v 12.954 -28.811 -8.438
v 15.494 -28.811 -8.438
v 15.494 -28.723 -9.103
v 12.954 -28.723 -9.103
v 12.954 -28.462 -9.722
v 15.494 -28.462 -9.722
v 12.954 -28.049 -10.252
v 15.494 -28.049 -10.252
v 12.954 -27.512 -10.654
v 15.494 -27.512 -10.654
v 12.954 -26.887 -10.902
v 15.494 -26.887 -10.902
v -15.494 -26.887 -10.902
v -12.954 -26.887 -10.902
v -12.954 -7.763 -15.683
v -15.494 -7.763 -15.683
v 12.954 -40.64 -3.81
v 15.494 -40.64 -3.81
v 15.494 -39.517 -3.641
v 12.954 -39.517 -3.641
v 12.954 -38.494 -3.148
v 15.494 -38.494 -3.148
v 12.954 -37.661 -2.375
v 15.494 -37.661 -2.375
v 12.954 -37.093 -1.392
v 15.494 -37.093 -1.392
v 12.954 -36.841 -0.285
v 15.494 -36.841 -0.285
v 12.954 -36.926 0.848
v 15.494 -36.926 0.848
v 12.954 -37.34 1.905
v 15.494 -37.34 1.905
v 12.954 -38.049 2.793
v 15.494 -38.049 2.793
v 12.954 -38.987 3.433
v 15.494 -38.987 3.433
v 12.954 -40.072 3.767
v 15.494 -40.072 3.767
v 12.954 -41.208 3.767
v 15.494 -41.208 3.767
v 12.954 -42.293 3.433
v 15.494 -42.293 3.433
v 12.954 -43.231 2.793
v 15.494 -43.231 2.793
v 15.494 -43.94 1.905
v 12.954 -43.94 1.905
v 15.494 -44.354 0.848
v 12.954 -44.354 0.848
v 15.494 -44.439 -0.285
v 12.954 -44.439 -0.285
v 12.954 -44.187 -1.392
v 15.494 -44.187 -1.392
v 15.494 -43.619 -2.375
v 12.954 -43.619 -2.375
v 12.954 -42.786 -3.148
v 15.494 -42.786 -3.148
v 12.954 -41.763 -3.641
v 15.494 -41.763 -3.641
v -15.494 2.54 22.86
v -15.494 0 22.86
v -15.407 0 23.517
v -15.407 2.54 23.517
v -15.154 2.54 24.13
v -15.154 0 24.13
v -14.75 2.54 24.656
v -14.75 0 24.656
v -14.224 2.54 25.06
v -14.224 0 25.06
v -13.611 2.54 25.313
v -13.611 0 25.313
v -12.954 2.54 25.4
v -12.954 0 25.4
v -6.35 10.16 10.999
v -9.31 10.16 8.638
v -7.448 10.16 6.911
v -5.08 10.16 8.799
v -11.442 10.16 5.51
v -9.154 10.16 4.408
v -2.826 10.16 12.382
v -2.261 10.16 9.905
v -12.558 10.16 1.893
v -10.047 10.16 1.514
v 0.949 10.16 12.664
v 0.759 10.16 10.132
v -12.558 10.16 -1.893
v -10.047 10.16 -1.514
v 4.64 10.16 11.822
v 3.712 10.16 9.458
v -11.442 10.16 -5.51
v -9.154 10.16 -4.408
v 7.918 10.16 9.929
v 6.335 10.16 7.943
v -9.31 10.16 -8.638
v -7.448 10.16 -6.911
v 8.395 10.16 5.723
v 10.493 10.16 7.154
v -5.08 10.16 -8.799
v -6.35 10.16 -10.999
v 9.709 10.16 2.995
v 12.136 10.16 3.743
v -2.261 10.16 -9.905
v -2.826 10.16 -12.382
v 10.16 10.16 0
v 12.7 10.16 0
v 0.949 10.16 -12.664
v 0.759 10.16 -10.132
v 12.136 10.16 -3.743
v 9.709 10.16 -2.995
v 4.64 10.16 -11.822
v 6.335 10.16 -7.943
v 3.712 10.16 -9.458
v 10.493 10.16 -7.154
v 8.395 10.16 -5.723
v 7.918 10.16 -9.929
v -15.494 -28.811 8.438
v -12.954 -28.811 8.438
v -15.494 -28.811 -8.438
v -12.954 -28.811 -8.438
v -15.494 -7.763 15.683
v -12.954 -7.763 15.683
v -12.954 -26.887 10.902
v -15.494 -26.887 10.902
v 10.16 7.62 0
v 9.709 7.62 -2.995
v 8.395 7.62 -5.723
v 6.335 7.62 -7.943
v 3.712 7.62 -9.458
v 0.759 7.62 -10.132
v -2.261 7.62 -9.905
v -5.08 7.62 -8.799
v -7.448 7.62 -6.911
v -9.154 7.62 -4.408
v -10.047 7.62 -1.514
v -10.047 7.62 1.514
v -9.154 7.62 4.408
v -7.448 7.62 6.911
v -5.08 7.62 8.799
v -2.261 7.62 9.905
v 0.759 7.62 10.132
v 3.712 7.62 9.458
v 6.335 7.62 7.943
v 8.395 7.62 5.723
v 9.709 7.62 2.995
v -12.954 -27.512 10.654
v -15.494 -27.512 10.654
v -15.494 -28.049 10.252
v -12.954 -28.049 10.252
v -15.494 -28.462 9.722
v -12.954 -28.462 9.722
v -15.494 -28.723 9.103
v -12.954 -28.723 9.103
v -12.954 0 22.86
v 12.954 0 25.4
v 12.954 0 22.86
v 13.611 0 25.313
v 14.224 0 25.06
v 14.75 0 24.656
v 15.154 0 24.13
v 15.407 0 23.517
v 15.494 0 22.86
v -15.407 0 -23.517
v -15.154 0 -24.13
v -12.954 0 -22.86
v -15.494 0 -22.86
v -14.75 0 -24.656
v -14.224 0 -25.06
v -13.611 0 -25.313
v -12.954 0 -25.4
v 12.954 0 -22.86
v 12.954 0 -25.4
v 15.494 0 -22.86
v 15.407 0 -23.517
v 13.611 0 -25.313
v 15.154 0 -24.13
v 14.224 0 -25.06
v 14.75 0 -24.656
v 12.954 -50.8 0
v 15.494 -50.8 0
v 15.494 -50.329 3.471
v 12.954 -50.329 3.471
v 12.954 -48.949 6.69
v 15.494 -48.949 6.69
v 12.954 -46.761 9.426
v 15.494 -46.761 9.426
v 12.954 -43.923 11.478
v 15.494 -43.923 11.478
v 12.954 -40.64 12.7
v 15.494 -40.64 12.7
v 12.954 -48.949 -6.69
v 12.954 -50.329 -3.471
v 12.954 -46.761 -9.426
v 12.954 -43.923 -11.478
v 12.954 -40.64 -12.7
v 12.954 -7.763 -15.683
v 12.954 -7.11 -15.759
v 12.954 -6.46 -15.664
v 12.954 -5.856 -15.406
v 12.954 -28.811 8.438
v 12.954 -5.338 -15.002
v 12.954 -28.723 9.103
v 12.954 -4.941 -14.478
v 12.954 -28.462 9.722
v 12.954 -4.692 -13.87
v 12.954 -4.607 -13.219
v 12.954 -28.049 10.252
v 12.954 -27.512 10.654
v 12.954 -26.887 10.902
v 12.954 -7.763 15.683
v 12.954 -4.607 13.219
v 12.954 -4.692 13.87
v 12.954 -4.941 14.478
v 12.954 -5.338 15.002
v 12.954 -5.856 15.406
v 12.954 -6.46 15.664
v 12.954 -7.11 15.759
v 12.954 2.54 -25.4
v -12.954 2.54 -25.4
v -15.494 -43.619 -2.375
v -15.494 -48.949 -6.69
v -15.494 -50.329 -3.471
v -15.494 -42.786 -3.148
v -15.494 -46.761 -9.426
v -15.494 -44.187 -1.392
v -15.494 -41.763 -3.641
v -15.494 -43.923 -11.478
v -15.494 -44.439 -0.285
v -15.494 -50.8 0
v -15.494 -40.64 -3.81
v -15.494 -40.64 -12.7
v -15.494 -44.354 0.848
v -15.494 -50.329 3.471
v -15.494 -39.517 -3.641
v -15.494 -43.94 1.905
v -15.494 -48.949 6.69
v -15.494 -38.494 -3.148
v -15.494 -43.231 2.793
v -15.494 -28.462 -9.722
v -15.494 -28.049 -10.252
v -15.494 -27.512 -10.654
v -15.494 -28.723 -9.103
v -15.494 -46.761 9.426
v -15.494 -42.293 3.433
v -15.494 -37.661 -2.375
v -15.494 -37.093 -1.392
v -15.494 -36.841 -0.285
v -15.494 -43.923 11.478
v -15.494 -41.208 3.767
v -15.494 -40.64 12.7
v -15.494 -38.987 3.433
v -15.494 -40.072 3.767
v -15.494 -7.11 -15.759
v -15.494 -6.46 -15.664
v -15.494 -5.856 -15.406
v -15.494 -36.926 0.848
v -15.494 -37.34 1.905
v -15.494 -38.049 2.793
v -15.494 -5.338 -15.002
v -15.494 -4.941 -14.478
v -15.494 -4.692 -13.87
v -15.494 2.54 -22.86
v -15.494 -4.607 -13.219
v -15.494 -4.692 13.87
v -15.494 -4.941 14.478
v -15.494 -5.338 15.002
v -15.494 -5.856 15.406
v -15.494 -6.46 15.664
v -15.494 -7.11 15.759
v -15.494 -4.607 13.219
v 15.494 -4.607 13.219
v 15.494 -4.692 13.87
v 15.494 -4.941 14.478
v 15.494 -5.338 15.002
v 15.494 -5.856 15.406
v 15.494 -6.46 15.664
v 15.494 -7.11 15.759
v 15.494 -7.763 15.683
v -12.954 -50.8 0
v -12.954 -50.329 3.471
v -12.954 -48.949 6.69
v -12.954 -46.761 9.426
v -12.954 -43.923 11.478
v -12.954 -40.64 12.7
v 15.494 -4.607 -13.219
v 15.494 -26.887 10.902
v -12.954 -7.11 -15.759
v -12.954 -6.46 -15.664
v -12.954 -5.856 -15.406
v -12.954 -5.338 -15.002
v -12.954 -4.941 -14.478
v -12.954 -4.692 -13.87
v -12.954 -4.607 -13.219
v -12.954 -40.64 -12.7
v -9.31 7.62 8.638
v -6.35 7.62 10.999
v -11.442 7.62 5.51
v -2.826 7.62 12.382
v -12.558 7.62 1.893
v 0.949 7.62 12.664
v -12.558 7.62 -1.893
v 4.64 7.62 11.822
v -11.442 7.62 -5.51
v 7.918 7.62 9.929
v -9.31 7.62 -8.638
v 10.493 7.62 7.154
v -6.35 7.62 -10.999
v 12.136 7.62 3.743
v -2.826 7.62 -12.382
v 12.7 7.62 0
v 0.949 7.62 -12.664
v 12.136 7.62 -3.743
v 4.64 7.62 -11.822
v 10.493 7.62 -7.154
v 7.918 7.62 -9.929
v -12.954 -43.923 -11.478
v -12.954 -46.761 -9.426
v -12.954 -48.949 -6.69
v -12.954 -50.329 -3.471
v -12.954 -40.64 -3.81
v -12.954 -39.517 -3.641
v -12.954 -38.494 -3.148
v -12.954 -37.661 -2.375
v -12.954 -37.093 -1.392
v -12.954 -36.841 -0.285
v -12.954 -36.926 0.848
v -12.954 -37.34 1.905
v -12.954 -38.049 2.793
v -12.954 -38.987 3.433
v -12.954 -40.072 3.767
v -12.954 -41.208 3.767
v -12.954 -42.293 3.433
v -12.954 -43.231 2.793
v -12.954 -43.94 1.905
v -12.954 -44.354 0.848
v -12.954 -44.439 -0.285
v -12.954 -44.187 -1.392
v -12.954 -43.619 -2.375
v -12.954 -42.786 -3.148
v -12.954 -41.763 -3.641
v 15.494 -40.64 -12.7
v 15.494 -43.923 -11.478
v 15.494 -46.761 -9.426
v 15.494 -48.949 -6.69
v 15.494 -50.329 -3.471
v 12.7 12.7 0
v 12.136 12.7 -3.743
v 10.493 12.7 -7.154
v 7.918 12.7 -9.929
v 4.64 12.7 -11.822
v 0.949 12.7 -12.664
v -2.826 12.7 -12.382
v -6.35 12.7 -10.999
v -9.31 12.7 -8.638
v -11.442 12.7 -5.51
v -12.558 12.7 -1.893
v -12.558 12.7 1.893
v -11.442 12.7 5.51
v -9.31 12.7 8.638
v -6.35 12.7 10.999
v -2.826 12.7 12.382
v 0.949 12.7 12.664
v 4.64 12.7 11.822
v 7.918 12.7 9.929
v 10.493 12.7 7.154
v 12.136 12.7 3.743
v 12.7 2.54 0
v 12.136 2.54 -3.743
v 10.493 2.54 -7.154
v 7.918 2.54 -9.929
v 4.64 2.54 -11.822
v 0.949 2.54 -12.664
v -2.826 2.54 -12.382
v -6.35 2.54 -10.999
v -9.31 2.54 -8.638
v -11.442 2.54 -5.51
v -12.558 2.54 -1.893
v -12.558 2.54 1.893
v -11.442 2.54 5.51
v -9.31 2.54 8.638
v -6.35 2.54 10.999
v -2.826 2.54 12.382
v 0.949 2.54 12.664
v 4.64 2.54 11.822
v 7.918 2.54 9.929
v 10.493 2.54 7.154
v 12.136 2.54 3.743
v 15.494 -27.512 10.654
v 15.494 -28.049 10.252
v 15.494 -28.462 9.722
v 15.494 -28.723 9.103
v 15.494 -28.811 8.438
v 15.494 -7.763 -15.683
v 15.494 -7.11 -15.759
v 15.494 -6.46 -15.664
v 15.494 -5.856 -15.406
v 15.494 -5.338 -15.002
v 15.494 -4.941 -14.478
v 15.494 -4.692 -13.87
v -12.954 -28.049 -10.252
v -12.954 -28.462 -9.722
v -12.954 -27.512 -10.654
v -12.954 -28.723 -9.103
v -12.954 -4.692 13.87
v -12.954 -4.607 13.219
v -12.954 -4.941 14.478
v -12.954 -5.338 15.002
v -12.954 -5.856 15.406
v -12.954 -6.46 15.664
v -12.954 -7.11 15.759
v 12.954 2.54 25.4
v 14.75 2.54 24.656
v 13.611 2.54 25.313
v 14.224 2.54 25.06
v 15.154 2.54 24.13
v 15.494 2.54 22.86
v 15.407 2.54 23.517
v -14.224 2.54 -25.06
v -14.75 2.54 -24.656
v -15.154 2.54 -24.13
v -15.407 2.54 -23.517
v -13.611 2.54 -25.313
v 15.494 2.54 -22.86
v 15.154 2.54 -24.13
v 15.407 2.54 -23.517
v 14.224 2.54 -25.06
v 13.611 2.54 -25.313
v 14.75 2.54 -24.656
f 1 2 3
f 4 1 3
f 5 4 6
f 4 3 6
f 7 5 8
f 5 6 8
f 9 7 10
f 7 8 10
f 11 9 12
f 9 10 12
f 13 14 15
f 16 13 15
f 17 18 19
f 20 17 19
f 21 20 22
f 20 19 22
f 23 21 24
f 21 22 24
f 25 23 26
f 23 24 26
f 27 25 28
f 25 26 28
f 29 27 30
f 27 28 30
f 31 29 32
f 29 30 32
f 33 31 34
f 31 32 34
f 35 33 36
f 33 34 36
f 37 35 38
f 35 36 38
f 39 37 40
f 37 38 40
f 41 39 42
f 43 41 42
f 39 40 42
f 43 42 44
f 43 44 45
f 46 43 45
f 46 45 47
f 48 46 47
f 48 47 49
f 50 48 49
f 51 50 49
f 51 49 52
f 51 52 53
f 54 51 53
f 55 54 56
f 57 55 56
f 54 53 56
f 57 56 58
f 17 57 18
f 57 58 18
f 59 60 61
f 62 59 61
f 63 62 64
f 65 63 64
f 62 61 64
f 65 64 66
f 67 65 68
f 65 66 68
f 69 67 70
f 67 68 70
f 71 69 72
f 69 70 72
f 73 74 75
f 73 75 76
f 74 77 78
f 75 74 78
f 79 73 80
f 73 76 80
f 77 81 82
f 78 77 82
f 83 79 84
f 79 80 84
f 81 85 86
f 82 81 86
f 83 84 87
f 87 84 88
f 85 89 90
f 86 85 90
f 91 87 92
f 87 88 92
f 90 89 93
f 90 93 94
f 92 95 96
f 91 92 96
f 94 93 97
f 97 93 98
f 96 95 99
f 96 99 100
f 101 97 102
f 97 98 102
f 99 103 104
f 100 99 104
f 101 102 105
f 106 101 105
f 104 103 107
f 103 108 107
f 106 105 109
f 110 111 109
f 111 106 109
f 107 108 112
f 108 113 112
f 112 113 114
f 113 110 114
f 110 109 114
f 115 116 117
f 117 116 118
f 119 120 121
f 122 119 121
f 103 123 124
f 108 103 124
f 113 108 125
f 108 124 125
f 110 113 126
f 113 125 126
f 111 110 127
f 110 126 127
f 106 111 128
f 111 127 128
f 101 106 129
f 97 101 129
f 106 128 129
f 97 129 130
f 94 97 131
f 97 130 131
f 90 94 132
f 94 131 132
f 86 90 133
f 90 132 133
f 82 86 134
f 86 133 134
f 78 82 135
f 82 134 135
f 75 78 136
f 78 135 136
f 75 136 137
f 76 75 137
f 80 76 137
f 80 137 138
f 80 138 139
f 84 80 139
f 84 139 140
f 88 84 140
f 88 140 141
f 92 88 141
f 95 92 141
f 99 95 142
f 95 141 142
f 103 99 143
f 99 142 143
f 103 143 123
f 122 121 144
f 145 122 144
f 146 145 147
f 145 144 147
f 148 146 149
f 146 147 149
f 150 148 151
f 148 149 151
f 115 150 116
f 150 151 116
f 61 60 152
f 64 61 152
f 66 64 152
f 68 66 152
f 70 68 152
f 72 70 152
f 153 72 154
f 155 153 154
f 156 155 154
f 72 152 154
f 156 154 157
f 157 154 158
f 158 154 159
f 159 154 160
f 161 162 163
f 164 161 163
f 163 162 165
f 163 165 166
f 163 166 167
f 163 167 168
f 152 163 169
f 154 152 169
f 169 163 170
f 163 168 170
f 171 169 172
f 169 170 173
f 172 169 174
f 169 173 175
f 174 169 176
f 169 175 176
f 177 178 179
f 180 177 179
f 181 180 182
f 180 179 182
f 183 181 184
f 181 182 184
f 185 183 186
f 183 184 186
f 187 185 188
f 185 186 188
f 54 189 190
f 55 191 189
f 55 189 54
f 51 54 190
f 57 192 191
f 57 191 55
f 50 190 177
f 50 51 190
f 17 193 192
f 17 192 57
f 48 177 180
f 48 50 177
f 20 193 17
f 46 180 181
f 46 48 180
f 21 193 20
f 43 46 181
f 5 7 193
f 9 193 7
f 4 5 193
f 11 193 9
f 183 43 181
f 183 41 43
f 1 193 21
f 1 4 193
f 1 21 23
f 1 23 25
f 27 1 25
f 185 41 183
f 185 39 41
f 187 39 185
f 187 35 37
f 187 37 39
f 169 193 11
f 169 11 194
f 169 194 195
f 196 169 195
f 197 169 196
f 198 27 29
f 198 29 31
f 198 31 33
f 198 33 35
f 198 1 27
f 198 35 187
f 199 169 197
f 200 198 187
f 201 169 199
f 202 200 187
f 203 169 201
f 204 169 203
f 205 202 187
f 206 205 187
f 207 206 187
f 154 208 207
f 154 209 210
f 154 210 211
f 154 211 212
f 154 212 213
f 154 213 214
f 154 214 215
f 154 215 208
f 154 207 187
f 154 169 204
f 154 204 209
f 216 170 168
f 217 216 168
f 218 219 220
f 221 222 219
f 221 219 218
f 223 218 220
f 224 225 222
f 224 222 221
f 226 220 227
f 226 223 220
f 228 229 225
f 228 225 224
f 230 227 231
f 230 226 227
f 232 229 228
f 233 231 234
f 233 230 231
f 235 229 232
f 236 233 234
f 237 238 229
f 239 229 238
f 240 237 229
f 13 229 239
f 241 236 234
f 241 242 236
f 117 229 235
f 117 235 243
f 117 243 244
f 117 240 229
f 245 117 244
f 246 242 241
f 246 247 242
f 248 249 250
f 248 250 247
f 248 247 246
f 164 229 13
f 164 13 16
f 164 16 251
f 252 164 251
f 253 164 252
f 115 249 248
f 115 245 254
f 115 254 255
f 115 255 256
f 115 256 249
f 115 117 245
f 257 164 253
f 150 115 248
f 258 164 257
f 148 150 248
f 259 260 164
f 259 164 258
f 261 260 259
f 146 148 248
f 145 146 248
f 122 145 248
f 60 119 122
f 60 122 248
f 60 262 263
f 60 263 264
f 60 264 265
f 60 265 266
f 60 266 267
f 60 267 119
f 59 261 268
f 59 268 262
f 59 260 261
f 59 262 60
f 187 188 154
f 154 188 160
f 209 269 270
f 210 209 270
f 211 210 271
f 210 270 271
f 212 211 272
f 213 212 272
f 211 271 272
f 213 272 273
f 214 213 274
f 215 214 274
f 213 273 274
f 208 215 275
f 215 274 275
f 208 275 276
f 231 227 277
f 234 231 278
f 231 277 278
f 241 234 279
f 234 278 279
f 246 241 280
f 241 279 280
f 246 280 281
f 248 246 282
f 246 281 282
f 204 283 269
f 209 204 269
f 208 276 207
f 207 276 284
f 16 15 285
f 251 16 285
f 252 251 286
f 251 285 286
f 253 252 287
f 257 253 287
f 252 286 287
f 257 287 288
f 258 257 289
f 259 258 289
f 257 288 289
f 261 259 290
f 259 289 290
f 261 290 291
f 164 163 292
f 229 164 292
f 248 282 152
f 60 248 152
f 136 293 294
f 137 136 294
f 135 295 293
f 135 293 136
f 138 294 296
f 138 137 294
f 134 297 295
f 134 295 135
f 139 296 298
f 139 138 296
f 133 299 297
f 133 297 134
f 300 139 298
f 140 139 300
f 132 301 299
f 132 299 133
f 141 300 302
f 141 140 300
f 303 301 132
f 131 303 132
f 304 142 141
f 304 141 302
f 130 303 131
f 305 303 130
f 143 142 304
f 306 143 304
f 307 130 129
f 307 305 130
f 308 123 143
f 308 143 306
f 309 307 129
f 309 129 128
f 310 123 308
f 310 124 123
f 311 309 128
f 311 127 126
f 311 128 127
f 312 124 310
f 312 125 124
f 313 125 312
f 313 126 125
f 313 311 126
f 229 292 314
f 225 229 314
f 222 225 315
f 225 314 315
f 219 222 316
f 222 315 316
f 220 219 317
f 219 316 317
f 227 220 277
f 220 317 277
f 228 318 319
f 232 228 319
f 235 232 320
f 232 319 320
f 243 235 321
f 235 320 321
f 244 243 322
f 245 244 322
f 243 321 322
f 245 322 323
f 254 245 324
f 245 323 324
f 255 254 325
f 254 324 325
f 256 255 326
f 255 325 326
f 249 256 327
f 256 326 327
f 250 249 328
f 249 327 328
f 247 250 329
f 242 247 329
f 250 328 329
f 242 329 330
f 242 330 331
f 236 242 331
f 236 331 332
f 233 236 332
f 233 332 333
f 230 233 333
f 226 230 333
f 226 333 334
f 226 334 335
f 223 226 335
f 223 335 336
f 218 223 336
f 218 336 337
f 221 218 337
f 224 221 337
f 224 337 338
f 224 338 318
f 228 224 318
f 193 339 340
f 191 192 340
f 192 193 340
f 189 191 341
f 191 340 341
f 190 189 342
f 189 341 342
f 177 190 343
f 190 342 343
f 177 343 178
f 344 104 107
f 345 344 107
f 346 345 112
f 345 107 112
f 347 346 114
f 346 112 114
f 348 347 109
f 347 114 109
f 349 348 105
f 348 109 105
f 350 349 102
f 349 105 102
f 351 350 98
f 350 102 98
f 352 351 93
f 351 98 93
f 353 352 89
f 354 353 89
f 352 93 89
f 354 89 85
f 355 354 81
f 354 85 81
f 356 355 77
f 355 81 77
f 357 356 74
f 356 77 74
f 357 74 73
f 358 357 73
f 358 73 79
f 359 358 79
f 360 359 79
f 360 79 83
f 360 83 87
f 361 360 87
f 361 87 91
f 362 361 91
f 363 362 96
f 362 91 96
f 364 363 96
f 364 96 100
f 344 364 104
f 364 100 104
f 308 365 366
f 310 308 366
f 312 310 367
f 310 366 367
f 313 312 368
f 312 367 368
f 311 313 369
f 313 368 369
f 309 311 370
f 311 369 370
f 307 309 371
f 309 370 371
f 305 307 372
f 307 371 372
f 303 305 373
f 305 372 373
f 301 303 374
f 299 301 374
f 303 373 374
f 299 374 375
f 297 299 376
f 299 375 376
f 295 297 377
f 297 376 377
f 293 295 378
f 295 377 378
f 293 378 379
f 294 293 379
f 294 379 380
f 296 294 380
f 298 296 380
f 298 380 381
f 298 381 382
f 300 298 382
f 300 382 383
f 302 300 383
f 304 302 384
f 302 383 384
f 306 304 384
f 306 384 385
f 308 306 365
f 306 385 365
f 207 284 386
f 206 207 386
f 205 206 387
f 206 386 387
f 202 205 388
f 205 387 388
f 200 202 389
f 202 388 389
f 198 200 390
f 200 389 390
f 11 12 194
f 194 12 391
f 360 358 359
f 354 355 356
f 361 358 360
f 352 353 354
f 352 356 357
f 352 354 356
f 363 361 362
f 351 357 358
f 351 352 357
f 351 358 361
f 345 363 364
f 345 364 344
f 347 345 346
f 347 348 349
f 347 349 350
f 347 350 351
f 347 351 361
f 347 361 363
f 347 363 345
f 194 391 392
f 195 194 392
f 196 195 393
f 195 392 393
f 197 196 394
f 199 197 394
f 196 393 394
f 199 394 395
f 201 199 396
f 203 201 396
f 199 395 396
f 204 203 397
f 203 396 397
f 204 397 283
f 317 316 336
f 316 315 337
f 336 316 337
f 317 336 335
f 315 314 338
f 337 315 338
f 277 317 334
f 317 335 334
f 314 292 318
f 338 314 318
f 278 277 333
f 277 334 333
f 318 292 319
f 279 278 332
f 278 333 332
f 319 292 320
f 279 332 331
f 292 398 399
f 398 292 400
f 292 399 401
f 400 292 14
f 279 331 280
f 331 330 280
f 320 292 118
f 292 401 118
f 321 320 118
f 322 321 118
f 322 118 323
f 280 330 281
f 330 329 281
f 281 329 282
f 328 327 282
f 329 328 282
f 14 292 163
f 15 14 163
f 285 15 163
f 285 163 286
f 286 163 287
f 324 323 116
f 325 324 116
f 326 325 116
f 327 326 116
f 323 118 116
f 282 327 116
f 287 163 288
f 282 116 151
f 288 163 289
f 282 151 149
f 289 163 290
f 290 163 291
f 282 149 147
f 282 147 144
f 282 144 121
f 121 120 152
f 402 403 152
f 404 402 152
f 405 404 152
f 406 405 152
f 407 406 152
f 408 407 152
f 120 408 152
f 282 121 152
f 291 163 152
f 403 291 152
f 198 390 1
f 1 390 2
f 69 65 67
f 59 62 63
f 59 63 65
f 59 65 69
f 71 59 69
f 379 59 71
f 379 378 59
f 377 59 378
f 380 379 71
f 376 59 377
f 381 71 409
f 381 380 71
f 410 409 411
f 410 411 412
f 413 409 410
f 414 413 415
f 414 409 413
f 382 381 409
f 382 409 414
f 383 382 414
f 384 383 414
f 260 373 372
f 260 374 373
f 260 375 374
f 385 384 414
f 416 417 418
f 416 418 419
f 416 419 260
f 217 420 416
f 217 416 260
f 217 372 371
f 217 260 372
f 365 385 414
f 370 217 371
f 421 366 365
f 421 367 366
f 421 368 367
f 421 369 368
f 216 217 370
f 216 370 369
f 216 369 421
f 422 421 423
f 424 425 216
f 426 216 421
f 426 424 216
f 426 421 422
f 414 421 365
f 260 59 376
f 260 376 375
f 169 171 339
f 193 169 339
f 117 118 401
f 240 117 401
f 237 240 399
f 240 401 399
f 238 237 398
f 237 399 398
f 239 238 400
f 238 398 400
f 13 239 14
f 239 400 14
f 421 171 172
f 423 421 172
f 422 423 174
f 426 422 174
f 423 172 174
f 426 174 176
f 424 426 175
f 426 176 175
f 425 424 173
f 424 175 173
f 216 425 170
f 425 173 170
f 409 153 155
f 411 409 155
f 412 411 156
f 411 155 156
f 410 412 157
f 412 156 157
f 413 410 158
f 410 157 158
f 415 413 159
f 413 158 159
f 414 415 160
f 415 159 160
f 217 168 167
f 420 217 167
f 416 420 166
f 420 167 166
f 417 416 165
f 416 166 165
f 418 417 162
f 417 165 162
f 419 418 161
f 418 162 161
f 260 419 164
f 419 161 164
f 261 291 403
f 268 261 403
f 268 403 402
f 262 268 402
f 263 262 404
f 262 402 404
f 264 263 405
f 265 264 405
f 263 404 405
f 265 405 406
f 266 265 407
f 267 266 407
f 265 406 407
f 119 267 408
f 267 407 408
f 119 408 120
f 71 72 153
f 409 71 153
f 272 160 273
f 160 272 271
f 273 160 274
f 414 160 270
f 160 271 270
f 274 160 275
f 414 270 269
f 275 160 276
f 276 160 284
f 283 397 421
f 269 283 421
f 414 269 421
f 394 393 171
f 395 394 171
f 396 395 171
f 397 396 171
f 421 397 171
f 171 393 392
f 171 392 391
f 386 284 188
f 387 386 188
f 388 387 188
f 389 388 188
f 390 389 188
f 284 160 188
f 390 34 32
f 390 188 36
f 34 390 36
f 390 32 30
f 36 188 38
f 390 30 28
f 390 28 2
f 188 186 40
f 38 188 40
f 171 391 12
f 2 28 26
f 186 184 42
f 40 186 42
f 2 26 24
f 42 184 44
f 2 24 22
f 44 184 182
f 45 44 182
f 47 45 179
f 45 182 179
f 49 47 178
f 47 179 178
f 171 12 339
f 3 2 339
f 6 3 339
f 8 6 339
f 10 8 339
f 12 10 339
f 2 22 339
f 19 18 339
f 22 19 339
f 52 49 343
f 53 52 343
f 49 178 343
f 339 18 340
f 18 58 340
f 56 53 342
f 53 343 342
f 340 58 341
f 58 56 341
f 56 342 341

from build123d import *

# Parameters (mm, degrees)
BOSS_EXTRUDE1_DEPTH = 2.54
SKETCH2_R           = 12.7
BOSS_EXTRUDE2_DEPTH = 5.08
SKETCH3_R           = 10.16
BOSS_EXTRUDE3_DEPTH = 2.54
SKETCH4_R           = 12.7
BOSS_EXTRUDE4_DEPTH = 2.54
SKETCH5_W           = 2.54
SKETCH5_H           = 45.72
BOSS_EXTRUDE5_DEPTH = 50.8
SKETCH6_R           = 3.81
CUT_EXTRUDE1_DEPTH  = 2.54
SKETCH6_3_R         = 3.81
CUT_EXTRUDE2_DEPTH  = 30.988
CUT_EXTRUDE3_DEPTH  = 31.988


with BuildPart() as part:
    # Sketch1 → Boss-Extrude1 (new body)
    with BuildSketch(Plane(origin=(0, 0, 0), x_dir=(1, 0, 0), z_dir=(0, 1, 0))):
        with BuildLine():
            Line((-12.954, -25.4), (12.954, -25.4))
            ThreePointArc((12.954, -25.4), (14.750051224, -24.656051224), (15.494, -22.86))
            Line((15.494, -22.86), (15.494, 22.86))
            ThreePointArc((15.494, 22.86), (14.750051224, 24.656051224), (12.954, 25.4))
            Line((12.954, 25.4), (-12.954, 25.4))
            ThreePointArc((-12.954, 25.4), (-14.750051224, 24.656051224), (-15.494, 22.86))
            Line((-15.494, 22.86), (-15.494, -22.86))
            ThreePointArc((-15.494, -22.86), (-14.750051224, -24.656051224), (-12.954, -25.4))
        make_face()
    extrude(amount=BOSS_EXTRUDE1_DEPTH)

    # Sketch2 → Boss-Extrude2 (add)
    with BuildSketch(Plane(origin=(0, 2.54, 0), x_dir=(1, 0, 0), z_dir=(0, 1, 0))):
        Circle(SKETCH2_R)
    extrude(amount=BOSS_EXTRUDE2_DEPTH)

    # Sketch3 → Boss-Extrude3 (add)
    with BuildSketch(Plane(origin=(0, 7.62, 0), x_dir=(1, 0, 0), z_dir=(0, 1, 0))):
        Circle(SKETCH3_R)
    extrude(amount=BOSS_EXTRUDE3_DEPTH)

    # Sketch4 → Boss-Extrude4 (add)
    with BuildSketch(Plane(origin=(0, 10.16, 0), x_dir=(1, 0, 0), z_dir=(0, 1, 0))):
        Circle(SKETCH4_R)
    extrude(amount=BOSS_EXTRUDE4_DEPTH)

    # Sketch5 → Boss-Extrude5 (add)
    with BuildSketch(Plane.XZ):
        with Locations((-14.224, 0)):
            Rectangle(SKETCH5_W, SKETCH5_H)
        with Locations((14.224, 0)):
            Rectangle(SKETCH5_W, SKETCH5_H)
    extrude(amount=BOSS_EXTRUDE5_DEPTH)

    # Sketch6 → Cut-Extrude1 (cut)
    with BuildSketch(Plane(origin=(15.494, 0, 0), x_dir=(0, 0, -1), z_dir=(1, 0, 0))):
        with Locations((0, -40.64)):
            Circle(SKETCH6_R)
    extrude(amount=-CUT_EXTRUDE1_DEPTH, mode=Mode.SUBTRACT)

    # Sketch6<3> → Cut-Extrude2 (cut)
    with BuildSketch(Plane(origin=(15.494, 0, 0), x_dir=(0, 0, -1), z_dir=(1, 0, 0))):
        with BuildLine():
            Line((-12.7, -40.64), (-22.86, 0))
            Line((-22.86, 0), (-22.86, -50.8))
            Line((-22.86, -50.8), (9e-09, -50.8))
            ThreePointArc((9e-09, -50.8), (-8.131967778, -47.94745973), (-12.7, -40.64))
        make_face()
        with BuildLine():
            ThreePointArc((12.7, -40.64), (8.131967785, -47.947459724), (9e-09, -50.8))
            Line((9e-09, -50.8), (22.86, -50.8))
            Line((22.86, -50.8), (22.86, 0))
            Line((22.86, 0), (12.7, -40.64))
        make_face()
        with Locations((0, -40.64)):
            Circle(SKETCH6_3_R)
    extrude(amount=-CUT_EXTRUDE2_DEPTH, mode=Mode.SUBTRACT)

    # Sketch7 → Cut-Extrude3 (cut, through all)
    with BuildSketch(Plane(origin=(15.494, 0, 0), x_dir=(0, 0, -1), z_dir=(1, 0, 0))):
        with BuildLine():
            Line((-15.682995336, -7.762642077), (-10.901798835, -26.887428081))
            ThreePointArc((-10.901798835, -26.887428081), (-10.000783897, -28.273429406), (-8.437636885, -28.811387593))
            Line((-8.437636885, -28.811387593), (8.437636885, -28.811387593))
            ThreePointArc((8.437636885, -28.811387593), (10.000783897, -28.273429406), (10.901798835, -26.887428081))
            Line((10.901798835, -26.887428081), (15.682995336, -7.762642077))
            ThreePointArc((15.682995336, -7.762642077), (15.220875198, -5.583454578), (13.218833386, -4.60660159))
            Line((13.218833386, -4.60660159), (-13.218833386, -4.60660159))
            ThreePointArc((-13.218833386, -4.60660159), (-15.220875198, -5.583454578), (-15.682995336, -7.762642077))
        make_face()
    extrude(amount=-CUT_EXTRUDE3_DEPTH, mode=Mode.SUBTRACT)


solid = part.part
